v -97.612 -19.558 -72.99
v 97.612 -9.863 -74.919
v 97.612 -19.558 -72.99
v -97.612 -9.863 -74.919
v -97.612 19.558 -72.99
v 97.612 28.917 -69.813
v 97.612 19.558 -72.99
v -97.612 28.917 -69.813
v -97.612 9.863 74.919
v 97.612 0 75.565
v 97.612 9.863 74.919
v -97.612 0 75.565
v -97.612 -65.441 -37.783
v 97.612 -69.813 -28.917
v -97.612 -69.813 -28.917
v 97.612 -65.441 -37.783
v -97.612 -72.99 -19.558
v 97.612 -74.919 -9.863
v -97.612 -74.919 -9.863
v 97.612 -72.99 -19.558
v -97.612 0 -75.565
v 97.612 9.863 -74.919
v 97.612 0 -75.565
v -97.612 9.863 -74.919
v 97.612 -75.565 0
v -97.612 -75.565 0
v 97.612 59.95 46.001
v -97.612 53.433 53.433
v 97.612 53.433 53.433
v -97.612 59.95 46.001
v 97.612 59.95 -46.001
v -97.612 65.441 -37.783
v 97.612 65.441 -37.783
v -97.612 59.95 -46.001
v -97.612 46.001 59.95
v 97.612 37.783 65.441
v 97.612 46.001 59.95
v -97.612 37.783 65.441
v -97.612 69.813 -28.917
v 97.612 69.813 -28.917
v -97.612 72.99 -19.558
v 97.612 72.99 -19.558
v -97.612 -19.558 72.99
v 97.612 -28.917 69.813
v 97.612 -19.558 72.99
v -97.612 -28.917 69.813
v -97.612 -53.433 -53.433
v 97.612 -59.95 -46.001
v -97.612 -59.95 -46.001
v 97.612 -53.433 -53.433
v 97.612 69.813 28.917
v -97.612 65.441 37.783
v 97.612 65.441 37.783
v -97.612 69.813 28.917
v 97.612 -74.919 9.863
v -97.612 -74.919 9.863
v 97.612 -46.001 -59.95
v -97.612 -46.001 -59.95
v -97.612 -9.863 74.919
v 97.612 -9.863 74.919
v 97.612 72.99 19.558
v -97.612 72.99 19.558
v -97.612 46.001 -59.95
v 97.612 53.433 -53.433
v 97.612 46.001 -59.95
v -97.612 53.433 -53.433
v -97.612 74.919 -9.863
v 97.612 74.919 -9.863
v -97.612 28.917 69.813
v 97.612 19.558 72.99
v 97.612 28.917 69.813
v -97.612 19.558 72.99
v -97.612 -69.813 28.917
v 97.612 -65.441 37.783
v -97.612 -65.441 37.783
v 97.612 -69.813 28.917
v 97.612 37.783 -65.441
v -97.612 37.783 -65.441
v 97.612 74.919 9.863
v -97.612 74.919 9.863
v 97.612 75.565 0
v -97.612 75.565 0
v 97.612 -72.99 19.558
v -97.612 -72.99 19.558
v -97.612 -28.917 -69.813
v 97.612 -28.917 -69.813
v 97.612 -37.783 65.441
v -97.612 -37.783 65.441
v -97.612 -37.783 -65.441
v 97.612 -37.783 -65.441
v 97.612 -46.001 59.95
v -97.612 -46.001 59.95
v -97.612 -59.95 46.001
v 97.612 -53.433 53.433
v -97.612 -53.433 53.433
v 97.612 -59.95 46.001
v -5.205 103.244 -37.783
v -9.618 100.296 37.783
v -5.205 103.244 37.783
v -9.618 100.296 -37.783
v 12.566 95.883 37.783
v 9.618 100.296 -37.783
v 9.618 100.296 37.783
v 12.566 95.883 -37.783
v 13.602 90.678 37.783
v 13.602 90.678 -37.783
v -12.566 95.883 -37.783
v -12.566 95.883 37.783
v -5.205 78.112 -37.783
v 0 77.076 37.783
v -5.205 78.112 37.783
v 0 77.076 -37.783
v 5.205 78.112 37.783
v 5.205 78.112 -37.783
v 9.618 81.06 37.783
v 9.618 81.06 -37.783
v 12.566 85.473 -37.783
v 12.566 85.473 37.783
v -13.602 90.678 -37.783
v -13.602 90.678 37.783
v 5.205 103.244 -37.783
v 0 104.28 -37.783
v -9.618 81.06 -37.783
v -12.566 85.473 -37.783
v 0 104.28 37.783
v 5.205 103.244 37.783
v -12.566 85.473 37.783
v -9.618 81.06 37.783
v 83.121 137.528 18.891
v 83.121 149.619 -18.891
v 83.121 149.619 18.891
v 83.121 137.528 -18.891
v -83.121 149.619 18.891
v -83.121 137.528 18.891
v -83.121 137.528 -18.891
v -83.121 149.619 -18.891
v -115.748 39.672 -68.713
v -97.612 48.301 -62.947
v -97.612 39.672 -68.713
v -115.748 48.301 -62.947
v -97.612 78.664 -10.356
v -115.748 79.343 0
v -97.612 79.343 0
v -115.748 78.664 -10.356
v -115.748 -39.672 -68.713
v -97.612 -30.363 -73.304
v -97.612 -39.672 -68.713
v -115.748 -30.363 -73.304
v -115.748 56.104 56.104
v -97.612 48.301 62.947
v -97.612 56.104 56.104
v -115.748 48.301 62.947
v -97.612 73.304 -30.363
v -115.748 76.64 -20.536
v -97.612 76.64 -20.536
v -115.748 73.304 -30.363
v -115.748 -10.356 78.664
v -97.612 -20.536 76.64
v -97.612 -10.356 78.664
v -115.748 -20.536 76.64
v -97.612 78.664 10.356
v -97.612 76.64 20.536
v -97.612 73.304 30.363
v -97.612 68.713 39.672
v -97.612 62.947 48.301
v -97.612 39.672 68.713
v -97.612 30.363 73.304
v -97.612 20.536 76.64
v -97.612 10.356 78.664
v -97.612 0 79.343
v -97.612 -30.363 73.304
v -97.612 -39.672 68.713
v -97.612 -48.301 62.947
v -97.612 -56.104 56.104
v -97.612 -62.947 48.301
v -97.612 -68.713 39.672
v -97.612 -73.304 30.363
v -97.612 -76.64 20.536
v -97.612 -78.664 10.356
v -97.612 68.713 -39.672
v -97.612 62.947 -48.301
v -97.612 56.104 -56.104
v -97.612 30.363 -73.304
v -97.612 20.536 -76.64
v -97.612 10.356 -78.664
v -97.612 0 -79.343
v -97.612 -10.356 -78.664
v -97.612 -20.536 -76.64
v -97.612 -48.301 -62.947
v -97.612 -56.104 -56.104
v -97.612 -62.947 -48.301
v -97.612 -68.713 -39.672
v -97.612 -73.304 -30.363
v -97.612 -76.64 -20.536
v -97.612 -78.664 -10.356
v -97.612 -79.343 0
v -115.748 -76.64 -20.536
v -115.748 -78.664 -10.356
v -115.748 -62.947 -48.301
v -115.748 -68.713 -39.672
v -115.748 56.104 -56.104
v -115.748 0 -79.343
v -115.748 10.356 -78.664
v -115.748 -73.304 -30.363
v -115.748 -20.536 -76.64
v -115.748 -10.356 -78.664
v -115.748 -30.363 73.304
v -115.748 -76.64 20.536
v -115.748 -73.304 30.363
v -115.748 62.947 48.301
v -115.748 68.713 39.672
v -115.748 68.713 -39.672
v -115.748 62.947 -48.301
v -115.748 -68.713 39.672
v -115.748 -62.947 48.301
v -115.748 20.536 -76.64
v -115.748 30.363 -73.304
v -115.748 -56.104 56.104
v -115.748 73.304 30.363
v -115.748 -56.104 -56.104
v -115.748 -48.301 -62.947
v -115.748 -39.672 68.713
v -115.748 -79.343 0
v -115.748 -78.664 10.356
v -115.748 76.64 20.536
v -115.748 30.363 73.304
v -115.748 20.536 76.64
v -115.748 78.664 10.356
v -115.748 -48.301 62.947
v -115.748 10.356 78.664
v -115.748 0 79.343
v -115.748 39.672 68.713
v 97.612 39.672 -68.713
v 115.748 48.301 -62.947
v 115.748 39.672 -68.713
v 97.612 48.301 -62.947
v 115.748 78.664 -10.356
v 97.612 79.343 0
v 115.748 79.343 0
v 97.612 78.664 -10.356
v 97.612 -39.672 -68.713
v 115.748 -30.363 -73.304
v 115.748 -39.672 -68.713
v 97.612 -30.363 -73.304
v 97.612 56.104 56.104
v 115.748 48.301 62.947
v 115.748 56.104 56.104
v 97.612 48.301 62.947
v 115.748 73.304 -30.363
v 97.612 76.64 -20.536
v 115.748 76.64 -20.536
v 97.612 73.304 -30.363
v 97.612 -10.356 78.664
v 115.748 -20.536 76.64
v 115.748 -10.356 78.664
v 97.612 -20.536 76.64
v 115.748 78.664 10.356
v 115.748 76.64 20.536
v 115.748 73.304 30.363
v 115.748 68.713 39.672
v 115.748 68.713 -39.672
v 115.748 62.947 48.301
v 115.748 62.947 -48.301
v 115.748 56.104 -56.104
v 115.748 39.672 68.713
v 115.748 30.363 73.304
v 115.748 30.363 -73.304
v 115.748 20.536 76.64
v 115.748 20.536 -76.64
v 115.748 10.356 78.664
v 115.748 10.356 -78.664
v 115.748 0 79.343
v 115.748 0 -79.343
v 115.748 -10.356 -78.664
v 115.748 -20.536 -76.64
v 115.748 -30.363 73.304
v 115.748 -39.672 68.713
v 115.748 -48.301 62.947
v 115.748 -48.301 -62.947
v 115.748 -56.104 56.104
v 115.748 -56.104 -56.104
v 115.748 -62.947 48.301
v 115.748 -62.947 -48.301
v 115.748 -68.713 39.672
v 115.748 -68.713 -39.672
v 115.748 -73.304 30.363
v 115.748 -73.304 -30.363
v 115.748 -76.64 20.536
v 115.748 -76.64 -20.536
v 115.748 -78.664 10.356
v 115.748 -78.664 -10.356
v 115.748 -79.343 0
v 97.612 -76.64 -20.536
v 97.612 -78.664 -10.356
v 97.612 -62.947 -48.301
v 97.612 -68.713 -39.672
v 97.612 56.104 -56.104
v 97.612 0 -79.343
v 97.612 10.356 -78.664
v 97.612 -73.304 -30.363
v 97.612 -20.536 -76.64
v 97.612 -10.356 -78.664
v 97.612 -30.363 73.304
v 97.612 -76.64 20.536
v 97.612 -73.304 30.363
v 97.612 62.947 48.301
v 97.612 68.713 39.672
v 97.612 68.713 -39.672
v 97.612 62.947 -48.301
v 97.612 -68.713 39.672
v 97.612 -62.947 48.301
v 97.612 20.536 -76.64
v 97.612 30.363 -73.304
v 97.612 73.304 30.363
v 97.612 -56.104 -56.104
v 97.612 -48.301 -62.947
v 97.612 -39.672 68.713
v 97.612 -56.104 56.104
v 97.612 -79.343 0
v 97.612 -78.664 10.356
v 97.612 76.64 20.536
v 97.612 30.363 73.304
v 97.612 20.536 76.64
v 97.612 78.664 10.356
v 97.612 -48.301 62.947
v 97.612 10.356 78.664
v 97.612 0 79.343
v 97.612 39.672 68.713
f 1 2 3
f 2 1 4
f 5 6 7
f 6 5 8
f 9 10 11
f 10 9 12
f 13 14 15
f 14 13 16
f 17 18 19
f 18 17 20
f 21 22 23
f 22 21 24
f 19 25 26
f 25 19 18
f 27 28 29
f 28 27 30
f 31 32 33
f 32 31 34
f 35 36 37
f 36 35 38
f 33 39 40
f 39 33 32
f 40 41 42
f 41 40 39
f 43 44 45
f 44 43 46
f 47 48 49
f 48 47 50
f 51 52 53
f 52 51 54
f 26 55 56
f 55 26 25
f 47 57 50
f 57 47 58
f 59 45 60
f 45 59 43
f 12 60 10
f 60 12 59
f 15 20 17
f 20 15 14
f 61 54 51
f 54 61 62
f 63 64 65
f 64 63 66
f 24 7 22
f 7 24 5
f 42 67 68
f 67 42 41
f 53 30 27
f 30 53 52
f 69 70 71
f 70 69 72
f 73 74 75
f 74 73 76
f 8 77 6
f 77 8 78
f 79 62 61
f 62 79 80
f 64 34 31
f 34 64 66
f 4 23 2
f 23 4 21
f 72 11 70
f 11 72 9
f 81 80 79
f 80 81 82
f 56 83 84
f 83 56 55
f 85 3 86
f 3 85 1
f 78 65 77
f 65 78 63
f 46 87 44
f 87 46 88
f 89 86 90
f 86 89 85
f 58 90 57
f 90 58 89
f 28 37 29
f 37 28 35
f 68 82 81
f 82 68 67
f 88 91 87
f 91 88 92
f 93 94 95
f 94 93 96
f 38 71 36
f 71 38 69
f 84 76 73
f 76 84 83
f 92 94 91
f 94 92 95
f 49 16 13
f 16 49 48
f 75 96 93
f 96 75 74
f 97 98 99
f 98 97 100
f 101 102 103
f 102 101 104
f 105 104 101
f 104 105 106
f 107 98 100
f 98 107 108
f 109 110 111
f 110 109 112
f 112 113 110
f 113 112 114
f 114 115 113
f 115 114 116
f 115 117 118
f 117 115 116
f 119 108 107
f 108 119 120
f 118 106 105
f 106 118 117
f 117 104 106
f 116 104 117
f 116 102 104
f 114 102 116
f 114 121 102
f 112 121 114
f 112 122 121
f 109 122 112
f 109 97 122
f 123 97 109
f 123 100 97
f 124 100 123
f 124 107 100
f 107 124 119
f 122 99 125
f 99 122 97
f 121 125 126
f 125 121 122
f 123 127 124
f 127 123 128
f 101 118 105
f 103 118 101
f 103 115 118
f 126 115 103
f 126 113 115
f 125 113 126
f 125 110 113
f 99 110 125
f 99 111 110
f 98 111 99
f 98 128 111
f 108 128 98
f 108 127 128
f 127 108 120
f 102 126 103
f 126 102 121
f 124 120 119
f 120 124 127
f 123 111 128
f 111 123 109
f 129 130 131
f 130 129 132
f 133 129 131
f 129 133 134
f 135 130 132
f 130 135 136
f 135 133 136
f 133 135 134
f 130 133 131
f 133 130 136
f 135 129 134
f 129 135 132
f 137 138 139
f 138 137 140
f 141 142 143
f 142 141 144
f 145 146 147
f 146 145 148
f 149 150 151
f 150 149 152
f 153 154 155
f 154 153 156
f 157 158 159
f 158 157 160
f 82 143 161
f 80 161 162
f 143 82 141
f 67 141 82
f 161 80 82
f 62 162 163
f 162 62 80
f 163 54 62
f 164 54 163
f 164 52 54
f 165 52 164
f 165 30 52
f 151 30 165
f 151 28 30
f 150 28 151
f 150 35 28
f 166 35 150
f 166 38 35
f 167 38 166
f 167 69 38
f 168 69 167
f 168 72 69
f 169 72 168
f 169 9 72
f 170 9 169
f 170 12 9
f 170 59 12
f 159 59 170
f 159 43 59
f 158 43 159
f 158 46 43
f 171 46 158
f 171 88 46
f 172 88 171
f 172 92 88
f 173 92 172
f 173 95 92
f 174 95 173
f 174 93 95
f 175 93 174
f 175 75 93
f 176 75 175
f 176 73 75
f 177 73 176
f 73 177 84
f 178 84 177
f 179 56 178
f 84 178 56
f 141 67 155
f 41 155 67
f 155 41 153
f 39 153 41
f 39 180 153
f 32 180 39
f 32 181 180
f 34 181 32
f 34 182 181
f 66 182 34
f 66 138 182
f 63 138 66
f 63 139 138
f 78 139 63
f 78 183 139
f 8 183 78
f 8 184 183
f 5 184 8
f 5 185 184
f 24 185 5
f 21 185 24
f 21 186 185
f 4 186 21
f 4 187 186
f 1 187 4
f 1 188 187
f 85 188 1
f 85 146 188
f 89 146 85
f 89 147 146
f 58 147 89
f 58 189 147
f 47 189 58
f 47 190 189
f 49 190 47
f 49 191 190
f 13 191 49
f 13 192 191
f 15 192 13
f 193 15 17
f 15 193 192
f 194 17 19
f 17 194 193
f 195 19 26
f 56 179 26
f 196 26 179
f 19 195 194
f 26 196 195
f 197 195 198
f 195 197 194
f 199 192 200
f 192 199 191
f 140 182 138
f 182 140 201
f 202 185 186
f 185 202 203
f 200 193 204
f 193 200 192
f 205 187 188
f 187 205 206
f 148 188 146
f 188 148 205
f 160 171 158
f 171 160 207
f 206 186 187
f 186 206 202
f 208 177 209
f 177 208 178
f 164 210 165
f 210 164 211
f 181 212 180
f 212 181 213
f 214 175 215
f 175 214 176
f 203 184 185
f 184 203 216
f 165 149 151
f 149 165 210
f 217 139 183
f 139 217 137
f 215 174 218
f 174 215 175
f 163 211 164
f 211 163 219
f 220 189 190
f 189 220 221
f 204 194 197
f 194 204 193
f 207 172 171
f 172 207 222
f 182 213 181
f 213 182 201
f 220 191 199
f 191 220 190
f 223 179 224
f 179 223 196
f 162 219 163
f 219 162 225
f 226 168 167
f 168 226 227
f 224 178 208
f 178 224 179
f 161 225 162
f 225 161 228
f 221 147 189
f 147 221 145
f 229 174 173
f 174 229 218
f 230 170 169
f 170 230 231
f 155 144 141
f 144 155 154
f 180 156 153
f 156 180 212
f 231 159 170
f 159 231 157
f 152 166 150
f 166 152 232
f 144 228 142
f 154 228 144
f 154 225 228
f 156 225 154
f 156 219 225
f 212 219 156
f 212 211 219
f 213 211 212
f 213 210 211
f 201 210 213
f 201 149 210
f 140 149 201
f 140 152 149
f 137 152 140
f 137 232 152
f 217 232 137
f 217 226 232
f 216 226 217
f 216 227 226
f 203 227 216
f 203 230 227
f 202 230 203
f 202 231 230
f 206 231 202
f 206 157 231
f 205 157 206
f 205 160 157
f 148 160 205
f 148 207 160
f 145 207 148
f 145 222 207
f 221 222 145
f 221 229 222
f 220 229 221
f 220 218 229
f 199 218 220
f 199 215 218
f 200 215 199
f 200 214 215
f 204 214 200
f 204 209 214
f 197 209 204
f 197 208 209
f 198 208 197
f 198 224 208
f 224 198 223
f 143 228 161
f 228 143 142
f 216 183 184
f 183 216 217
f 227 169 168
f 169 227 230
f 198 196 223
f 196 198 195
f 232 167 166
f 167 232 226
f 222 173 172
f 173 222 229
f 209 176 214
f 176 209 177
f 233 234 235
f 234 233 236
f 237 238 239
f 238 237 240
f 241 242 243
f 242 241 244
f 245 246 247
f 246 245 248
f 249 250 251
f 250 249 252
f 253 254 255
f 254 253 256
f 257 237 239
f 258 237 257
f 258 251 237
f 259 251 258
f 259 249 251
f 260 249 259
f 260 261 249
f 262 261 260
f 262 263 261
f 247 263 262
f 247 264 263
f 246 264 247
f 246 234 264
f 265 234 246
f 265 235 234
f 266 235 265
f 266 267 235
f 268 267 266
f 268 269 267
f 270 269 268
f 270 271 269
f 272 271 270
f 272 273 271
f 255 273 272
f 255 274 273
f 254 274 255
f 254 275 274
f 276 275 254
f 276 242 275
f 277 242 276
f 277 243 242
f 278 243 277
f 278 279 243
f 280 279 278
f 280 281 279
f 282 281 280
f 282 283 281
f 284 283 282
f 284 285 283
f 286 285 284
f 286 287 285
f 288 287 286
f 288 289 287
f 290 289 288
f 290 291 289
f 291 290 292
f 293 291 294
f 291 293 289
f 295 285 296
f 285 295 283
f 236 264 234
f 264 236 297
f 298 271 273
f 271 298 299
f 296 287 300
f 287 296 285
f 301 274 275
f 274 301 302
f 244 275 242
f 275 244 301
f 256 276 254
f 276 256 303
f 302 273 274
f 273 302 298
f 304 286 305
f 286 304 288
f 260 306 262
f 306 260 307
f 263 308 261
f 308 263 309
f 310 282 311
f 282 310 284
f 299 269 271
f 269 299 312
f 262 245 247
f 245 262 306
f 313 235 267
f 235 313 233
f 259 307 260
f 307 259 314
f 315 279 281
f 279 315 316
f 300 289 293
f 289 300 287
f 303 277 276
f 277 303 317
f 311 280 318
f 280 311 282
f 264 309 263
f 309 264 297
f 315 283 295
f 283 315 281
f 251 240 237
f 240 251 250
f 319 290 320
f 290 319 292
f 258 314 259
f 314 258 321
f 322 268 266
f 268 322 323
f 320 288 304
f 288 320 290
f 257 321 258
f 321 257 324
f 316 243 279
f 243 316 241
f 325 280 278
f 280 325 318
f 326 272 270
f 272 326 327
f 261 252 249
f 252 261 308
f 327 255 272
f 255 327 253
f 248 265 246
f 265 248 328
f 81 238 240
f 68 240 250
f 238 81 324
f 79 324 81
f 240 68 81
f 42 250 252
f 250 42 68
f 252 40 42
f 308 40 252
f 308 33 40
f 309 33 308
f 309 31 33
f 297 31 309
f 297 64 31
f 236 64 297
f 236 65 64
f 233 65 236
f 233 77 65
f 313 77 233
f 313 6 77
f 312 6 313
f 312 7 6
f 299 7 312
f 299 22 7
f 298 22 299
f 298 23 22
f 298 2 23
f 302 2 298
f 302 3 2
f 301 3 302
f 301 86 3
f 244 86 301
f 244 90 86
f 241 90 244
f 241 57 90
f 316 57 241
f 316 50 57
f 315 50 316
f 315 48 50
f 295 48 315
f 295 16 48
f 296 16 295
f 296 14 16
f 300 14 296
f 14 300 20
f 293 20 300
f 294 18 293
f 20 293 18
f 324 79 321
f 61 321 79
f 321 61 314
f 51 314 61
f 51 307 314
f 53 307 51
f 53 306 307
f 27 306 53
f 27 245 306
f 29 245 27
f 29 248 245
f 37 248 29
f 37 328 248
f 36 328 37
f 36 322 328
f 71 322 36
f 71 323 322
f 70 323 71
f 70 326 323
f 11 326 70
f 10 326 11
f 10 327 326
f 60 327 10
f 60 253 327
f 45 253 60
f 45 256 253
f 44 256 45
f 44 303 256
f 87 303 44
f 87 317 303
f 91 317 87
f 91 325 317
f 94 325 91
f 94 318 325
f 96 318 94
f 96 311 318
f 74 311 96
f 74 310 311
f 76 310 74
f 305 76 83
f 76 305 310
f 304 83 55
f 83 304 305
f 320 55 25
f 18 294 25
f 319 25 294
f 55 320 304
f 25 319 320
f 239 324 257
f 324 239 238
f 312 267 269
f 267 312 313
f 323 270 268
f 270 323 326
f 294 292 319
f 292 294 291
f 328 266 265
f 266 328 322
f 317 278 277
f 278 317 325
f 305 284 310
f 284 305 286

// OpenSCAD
// Auto-generated by scripts/author_from_manifest.py (Phase D.3).
// Source: data/phase_d_manifest.json (sku_intent='viking-model-g-preaction-3in').
// Do not hand-edit — regenerate from the manifest.
//
// @part viking_model_g_preaction_3in
// @kind valve
// @category valve.preaction
// @display-name "Viking Model G Preaction Valve 3\""
// @mfg viking_group
// @mfg-pn Model_G
// @listing UL FM
// @price-usd 1650.00
// @install-minutes 90
// @crew foreman
// @param size_in number default=3 label="Size" unit="in"
// @port inlet position=[-0.05,0,0] direction=[-1,0,0] style=grooved size_in=3 role=run_a
// @port outlet position=[0.05,0,0] direction=[1,0,0] style=grooved size_in=3 role=run_b

size_in = 3.0;

function od_mm(nps) =
    nps ==   1  ? 33.4 :
    nps == 1.25 ? 42.2 :
    nps == 1.5  ? 48.3 :
    nps ==   2  ? 60.3 :
    nps == 2.5  ? 73.0 :
    nps ==   3  ? 88.9 :
    nps ==   4  ? 114.3 :
    nps ==   6  ? 168.3 :
    nps ==   8  ? 219.1 : 73.0;

od = od_mm(size_in);
body_len = od * 2.4;
body_d   = od * 1.7;

union() {
    // Valve body
    rotate([0, 90, 0])
        cylinder(h = body_len, d = body_d, center = true, $fn = 48);
    // Stem / handle indicator
    translate([0, body_d * 0.6, 0])
        cylinder(h = body_d * 0.5, d = body_d * 0.18, center = true, $fn = 16);
    translate([0, body_d * 0.95, 0])
        cube([body_d * 1.1, body_d * 0.08, body_d * 0.25], center = true);
    // End flanges
    translate([-body_len/2, 0, 0])
        rotate([0, 90, 0])
        cylinder(h = body_d * 0.12, d = body_d * 1.05, center = true, $fn = 48);
    translate([ body_len/2, 0, 0])
        rotate([0, 90, 0])
        cylinder(h = body_d * 0.12, d = body_d * 1.05, center = true, $fn = 48);
}
